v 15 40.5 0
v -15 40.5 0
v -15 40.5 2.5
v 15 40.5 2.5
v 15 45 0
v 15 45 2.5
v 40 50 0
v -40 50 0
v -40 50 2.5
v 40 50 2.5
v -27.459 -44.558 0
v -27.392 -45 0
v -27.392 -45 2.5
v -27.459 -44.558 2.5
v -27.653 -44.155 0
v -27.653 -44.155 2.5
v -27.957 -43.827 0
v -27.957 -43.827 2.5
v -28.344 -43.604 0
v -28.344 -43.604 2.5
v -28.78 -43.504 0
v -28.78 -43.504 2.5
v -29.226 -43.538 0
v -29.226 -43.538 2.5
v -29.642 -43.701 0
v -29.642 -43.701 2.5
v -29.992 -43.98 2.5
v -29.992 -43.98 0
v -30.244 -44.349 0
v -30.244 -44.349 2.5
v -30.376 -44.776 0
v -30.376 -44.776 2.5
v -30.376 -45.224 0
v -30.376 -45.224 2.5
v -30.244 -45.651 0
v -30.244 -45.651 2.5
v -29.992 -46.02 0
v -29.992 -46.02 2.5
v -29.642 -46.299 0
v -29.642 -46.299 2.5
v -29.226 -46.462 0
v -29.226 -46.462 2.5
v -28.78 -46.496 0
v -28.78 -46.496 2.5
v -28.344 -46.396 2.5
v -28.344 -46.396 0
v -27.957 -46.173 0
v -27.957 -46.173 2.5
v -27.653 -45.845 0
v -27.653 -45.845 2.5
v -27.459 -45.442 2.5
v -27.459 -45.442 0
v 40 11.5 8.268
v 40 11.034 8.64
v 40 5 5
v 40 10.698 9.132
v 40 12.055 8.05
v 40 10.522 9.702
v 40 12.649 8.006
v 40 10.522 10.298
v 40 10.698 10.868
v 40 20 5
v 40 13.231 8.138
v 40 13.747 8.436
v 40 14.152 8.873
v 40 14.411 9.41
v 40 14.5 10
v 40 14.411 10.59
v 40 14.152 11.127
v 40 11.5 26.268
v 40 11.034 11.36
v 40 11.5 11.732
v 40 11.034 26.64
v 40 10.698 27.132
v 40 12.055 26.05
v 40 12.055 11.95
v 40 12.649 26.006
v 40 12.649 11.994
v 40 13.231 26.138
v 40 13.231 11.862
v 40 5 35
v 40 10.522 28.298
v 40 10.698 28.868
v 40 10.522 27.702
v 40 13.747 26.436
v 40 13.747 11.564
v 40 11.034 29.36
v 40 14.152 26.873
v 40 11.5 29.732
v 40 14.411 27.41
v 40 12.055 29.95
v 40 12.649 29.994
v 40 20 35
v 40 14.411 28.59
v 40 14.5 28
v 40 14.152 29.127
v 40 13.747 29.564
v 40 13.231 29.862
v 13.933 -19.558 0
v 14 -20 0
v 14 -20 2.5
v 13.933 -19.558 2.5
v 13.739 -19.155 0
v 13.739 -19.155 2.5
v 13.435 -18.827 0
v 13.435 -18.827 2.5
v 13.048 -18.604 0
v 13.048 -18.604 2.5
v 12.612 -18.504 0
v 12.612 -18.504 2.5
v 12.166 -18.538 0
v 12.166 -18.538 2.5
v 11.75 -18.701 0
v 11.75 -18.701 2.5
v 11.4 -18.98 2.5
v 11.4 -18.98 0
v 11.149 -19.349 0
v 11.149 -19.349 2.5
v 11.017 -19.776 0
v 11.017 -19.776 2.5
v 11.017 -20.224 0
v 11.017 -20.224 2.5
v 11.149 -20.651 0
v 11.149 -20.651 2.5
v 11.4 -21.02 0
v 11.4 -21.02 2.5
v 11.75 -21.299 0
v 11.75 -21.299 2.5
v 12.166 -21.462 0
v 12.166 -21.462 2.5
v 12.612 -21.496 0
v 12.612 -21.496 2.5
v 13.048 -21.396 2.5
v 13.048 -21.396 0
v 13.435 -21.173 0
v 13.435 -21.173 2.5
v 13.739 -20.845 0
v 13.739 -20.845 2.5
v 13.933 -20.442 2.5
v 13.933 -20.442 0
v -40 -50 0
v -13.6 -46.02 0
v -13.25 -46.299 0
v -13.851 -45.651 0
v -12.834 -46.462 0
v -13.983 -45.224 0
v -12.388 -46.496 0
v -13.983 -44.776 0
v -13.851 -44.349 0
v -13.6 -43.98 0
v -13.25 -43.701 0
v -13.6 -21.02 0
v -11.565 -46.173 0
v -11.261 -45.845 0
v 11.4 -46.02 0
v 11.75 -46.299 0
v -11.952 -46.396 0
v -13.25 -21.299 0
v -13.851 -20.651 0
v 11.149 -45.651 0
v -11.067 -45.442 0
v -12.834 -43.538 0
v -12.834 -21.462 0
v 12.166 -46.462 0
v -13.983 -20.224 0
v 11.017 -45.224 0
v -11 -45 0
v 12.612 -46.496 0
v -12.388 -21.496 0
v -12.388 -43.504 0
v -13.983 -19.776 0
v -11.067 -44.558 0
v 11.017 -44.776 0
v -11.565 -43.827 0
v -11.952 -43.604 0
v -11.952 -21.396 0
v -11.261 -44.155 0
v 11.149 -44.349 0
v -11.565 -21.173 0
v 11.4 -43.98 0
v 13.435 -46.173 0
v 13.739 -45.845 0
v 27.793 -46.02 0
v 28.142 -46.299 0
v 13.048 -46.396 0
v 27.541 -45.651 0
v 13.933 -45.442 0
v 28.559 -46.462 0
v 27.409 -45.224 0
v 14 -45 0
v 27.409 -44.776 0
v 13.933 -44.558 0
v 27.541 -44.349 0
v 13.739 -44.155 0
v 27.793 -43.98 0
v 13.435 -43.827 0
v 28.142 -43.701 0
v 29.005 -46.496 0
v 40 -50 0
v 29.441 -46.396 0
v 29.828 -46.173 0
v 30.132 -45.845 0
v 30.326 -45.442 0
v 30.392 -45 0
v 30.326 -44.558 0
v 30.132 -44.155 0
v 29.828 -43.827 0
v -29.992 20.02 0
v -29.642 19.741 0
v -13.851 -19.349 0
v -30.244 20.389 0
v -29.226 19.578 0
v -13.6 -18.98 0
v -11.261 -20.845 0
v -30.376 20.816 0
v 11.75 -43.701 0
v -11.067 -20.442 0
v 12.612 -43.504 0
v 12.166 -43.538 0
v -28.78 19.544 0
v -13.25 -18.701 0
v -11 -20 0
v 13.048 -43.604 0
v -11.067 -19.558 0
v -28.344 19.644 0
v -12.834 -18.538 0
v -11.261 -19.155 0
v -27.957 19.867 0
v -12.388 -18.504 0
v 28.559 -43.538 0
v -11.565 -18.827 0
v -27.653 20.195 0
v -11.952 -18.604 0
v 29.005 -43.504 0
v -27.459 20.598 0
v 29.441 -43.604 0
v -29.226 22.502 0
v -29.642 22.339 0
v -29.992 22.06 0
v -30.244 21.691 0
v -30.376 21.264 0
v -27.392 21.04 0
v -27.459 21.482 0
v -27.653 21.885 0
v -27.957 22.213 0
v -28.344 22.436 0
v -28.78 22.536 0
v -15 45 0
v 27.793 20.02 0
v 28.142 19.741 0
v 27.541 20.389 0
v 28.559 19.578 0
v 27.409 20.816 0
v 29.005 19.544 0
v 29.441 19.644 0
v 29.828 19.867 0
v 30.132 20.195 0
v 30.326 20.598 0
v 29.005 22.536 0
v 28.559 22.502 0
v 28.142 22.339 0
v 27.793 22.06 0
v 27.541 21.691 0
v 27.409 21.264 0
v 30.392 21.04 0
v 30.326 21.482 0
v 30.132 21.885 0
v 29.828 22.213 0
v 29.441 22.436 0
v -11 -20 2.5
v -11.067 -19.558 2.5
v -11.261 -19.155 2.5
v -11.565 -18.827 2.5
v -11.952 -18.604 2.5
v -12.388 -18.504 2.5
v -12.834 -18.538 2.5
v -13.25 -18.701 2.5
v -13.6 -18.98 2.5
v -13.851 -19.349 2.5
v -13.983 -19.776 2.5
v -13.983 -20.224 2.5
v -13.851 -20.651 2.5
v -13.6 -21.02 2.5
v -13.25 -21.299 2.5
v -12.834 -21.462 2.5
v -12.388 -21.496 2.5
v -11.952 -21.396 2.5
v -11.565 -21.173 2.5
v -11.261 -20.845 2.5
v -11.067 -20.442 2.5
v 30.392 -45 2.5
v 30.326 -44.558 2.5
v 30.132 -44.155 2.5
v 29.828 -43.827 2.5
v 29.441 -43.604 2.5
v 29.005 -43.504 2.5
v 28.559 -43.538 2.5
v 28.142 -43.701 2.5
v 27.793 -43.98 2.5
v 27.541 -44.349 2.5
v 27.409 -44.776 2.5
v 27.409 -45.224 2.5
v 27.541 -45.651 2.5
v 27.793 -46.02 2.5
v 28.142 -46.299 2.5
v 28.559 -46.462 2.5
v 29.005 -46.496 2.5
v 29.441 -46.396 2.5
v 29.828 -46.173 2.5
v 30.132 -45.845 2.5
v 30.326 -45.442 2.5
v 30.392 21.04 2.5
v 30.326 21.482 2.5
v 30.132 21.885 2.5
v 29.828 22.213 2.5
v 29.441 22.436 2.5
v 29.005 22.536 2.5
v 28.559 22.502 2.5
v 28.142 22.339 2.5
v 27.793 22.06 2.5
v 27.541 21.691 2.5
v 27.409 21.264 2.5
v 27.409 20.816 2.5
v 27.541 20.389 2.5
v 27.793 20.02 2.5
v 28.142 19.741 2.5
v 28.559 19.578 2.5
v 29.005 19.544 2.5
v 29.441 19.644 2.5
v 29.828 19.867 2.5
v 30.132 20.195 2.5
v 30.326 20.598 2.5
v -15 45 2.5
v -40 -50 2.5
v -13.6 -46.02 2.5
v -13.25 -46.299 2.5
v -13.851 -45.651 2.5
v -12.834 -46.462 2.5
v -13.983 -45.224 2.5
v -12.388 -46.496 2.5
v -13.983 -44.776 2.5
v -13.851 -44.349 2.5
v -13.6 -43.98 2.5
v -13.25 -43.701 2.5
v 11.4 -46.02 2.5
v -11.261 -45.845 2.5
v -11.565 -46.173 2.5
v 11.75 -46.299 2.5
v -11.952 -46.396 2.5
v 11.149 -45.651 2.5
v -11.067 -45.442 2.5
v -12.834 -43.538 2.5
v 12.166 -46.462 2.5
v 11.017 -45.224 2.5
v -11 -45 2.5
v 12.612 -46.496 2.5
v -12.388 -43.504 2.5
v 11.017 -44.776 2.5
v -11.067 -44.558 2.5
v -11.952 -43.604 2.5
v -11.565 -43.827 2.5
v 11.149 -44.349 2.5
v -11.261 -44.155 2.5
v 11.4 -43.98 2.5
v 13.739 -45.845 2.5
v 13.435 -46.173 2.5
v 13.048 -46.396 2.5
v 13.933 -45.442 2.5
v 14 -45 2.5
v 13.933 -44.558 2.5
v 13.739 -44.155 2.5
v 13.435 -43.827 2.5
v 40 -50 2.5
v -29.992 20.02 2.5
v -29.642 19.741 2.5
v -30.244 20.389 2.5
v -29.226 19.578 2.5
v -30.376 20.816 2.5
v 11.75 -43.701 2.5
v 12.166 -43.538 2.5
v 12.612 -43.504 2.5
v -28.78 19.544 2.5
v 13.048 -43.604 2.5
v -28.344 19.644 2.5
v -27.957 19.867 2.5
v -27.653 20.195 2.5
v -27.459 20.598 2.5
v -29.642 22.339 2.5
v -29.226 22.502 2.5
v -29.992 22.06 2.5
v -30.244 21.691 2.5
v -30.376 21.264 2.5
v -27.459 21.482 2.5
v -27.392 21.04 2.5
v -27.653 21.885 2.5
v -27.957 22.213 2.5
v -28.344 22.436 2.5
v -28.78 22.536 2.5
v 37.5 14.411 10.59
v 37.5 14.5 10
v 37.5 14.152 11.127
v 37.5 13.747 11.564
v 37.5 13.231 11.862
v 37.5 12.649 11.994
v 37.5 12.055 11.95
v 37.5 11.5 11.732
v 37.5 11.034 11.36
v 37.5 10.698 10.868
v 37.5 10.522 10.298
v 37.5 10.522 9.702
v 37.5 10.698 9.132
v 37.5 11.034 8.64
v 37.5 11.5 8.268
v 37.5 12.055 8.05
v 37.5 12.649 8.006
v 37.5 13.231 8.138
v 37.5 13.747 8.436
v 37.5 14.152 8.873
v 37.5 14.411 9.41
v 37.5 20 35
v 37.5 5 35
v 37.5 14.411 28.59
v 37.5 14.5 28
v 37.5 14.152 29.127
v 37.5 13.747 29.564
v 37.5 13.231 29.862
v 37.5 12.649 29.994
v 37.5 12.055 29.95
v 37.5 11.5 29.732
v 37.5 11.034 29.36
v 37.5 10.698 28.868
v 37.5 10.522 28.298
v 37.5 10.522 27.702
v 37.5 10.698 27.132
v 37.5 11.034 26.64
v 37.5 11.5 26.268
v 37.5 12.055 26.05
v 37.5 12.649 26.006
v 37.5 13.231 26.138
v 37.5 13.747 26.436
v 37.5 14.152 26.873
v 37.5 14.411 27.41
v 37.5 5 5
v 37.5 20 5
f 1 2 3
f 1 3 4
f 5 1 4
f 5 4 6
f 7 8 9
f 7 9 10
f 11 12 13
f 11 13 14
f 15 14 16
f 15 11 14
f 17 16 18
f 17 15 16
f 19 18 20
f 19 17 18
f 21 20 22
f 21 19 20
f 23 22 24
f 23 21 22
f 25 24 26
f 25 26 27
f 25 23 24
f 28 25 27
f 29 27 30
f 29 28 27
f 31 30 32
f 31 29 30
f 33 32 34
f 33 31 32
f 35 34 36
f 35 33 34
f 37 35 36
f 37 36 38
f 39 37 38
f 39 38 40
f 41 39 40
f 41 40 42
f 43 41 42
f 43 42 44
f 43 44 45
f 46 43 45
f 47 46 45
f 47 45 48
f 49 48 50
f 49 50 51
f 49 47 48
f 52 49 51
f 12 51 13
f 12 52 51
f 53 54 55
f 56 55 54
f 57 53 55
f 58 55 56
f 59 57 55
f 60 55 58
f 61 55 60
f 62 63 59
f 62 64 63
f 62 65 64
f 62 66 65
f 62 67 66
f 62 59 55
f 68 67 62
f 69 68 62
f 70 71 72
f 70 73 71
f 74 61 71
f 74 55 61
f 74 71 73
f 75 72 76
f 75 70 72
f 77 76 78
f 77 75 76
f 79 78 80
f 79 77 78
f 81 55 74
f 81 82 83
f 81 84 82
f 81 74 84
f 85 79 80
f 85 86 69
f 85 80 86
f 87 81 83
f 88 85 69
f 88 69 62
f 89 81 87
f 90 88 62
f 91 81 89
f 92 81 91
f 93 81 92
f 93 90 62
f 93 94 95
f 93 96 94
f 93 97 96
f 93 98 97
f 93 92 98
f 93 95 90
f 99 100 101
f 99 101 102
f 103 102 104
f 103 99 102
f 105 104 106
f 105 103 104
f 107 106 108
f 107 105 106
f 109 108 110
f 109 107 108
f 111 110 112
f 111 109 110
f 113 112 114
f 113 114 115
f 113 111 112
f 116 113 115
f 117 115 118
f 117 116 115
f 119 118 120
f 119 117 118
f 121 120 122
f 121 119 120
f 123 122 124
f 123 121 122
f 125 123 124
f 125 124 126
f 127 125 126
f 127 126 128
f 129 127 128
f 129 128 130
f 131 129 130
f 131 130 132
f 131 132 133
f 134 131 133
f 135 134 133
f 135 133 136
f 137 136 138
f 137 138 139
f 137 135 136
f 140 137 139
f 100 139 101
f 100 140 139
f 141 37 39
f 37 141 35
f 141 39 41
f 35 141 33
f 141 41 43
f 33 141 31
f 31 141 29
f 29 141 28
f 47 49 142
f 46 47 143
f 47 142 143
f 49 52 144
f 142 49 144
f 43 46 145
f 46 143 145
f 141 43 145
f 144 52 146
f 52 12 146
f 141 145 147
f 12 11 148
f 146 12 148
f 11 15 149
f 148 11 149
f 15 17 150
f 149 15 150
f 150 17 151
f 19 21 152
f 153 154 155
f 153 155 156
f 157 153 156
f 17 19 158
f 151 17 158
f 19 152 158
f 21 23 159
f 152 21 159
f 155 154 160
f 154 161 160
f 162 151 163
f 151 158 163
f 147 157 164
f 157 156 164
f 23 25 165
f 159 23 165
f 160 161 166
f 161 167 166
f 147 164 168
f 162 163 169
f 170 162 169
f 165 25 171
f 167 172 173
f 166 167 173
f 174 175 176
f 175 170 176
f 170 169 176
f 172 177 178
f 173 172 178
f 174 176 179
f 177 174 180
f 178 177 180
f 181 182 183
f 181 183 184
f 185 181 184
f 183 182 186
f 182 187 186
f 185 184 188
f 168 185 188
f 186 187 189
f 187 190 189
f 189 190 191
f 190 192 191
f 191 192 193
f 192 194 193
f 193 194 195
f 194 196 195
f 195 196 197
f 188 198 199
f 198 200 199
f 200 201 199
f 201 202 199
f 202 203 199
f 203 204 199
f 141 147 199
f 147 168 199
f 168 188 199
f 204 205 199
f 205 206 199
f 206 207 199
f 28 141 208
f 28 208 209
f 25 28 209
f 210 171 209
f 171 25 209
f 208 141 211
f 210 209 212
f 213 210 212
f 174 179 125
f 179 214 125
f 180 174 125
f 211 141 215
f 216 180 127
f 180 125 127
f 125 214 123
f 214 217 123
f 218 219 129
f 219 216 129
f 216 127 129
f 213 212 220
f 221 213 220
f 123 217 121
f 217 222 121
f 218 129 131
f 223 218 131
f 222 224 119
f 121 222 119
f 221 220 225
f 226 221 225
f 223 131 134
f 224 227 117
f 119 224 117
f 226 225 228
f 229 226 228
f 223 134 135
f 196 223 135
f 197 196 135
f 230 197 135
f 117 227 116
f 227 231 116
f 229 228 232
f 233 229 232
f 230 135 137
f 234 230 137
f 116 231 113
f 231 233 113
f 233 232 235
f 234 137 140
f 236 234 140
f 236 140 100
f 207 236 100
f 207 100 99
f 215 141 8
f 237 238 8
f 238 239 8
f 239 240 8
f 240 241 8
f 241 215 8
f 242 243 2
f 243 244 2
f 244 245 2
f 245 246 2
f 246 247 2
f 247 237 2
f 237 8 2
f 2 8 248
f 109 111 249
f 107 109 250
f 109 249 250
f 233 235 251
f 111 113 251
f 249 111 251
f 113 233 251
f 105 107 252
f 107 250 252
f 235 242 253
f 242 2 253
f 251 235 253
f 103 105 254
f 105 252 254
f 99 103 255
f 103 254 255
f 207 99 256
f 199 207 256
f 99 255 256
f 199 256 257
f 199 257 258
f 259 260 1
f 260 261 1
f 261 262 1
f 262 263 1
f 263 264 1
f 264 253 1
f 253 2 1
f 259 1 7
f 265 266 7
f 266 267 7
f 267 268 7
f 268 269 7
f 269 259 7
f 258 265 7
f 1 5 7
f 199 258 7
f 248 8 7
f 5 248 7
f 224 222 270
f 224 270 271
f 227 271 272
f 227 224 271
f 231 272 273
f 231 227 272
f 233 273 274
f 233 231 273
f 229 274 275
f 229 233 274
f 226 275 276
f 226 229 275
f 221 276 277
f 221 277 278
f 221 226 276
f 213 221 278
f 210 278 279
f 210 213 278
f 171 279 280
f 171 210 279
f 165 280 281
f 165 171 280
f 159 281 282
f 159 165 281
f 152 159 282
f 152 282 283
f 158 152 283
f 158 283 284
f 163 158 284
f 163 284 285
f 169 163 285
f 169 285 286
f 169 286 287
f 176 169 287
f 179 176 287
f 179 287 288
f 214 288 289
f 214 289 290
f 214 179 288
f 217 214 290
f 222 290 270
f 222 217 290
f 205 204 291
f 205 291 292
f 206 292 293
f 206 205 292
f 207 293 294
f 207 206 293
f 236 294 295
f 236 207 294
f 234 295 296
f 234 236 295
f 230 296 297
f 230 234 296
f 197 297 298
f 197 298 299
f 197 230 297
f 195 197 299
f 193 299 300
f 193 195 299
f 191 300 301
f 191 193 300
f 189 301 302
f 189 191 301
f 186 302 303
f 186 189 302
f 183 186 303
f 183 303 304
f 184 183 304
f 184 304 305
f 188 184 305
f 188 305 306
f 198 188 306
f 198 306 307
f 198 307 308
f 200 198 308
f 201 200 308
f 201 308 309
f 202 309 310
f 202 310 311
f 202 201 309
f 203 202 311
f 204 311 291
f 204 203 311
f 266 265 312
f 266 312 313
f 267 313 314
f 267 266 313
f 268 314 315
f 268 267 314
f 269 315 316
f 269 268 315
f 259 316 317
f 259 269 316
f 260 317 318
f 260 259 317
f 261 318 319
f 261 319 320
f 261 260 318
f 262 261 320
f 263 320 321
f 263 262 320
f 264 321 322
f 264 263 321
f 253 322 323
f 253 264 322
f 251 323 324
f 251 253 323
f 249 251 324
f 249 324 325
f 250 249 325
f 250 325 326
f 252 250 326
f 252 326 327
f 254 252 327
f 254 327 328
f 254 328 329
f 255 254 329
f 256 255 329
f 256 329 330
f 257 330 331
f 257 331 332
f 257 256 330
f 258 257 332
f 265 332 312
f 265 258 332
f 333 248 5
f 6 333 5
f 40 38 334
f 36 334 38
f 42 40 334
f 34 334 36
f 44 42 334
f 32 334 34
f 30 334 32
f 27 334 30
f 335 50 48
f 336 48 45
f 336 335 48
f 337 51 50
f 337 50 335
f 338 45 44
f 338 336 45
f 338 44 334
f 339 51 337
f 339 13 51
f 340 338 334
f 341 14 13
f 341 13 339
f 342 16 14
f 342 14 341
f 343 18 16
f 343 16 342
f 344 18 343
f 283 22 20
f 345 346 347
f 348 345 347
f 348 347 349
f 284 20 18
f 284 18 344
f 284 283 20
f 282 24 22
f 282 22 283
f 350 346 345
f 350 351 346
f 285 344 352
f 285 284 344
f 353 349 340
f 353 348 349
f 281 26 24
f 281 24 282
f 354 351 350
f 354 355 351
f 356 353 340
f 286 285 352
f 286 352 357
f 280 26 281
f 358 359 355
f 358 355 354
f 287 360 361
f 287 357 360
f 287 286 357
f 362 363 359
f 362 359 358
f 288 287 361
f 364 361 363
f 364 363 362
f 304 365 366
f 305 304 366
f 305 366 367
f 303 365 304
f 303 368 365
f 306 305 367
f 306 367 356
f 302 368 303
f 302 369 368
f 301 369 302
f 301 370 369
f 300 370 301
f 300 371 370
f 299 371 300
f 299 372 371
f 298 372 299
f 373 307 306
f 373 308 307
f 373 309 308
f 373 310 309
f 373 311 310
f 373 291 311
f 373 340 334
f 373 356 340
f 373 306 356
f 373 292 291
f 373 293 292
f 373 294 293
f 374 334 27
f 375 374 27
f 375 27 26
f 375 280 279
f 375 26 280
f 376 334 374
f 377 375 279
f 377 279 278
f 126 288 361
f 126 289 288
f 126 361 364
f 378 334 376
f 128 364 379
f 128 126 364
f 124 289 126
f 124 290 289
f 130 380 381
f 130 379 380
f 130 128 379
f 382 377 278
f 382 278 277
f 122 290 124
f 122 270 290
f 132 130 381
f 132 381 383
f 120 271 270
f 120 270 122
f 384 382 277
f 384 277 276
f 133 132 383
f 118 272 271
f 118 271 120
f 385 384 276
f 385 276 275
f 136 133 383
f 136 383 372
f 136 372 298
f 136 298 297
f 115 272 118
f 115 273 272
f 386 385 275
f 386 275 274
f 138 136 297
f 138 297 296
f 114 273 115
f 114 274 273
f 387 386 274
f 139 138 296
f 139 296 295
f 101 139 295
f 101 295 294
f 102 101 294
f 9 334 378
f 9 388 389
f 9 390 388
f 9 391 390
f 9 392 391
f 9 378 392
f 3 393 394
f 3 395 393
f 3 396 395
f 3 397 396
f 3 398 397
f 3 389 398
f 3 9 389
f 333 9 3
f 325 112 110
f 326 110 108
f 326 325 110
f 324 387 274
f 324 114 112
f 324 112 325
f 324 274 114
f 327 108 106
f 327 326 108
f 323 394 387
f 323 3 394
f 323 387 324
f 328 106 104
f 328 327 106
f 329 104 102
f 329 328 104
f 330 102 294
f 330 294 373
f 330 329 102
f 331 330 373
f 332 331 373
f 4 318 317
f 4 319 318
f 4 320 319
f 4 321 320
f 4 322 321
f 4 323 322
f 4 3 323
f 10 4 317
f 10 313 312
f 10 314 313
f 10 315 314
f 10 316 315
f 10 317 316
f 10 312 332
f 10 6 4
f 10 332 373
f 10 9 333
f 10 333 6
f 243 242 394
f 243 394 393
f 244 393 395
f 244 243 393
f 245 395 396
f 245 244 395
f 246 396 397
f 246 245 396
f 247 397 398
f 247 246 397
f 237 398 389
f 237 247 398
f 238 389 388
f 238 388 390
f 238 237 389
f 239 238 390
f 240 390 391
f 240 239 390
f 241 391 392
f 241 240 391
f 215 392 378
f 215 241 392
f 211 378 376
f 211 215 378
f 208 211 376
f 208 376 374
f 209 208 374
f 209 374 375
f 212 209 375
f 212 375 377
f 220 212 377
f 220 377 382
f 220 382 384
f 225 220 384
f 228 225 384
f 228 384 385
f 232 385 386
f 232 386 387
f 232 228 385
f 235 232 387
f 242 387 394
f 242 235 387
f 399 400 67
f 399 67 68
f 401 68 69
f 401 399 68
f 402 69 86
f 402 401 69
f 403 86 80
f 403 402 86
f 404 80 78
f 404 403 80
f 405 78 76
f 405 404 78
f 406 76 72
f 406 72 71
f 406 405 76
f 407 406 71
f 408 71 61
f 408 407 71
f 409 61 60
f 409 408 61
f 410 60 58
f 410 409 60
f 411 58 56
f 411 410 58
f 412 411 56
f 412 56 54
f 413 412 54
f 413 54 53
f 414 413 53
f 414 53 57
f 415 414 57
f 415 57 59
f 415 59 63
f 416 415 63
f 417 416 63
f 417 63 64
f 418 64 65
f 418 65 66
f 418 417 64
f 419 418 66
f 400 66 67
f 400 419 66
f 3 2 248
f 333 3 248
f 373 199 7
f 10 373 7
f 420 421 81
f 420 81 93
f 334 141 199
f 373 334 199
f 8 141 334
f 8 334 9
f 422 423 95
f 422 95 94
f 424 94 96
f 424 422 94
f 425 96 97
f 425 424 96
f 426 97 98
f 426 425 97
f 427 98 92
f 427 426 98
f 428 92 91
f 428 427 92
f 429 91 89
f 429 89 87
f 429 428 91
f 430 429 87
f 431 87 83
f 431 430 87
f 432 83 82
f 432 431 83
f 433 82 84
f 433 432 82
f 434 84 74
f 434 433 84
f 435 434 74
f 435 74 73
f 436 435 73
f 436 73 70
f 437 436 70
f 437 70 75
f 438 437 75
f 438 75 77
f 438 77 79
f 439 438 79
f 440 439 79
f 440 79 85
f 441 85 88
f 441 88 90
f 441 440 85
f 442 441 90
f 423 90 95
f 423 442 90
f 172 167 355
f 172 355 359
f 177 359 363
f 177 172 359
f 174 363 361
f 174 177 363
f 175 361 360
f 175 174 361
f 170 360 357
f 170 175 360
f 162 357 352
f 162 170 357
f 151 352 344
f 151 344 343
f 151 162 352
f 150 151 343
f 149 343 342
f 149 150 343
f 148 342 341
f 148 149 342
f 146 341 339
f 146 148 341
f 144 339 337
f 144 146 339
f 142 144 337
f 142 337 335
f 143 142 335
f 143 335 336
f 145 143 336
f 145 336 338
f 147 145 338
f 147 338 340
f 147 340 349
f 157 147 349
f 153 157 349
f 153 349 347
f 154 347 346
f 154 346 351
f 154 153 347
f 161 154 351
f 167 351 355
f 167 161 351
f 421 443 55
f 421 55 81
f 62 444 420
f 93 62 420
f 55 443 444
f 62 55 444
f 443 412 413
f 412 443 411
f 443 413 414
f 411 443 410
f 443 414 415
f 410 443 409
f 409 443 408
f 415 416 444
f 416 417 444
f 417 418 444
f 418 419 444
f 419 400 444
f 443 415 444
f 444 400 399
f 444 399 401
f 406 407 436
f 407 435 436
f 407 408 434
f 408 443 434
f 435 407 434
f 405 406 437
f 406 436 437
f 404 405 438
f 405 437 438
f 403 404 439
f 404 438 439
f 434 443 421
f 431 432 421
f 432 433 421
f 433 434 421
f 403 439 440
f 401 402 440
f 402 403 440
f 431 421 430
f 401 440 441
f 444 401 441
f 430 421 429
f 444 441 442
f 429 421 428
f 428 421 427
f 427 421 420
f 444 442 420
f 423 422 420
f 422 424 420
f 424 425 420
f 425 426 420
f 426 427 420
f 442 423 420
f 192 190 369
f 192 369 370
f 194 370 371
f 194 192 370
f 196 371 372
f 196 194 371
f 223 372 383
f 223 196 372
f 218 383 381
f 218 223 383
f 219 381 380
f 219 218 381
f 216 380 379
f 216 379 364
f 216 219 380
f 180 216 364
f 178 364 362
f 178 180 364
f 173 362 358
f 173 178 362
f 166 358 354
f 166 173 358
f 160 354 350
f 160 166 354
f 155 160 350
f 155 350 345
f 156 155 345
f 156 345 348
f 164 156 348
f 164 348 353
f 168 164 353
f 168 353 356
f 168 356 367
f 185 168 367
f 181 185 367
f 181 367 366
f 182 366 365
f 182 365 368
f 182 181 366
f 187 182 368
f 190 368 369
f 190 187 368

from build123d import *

# Parameters (mm, degrees)
SKETCH001_W   = 80
SKETCH001_H   = 100
SKETCH001_R   = 1.5
SKETCH001_W_2 = 30
SKETCH001_H_2 = 4.5
PAD_DEPTH     = 2.5
SKETCH_W      = 15
SKETCH_H      = 30
SKETCH_R      = 2
PAD001_DEPTH  = 2.5


with BuildPart() as base:
    # Sketch001 → Pad (new body)
    with BuildSketch(Plane.XY):
        Rectangle(SKETCH001_W, SKETCH001_H)
        with Locations((-28.8925, 21.04)):
            Circle(SKETCH001_R, mode=Mode.SUBTRACT)
        with Locations((-28.8925, -45)):
            Circle(SKETCH001_R, mode=Mode.SUBTRACT)
        with Locations((28.8925, -45)):
            Circle(SKETCH001_R, mode=Mode.SUBTRACT)
        with Locations((28.8925, 21.04)):
            Circle(SKETCH001_R, mode=Mode.SUBTRACT)
        with Locations((-12.5, -20)):
            Circle(SKETCH001_R, mode=Mode.SUBTRACT)
        with Locations((-12.5, -45)):
            Circle(SKETCH001_R, mode=Mode.SUBTRACT)
        with Locations((12.5, -20)):
            Circle(SKETCH001_R, mode=Mode.SUBTRACT)
        with Locations((12.5, -45)):
            Circle(SKETCH001_R, mode=Mode.SUBTRACT)
        with Locations((0, 42.75)):
            Rectangle(SKETCH001_W_2, SKETCH001_H_2, mode=Mode.SUBTRACT)
    extrude(amount=PAD_DEPTH)


with BuildPart() as motorholder:
    # Sketch → Pad001 (new body)
    with BuildSketch(Plane.YZ):
        with Locations((12.5, 20)):
            Rectangle(SKETCH_W, SKETCH_H)
        with Locations((12.5, 28)):
            Circle(SKETCH_R, mode=Mode.SUBTRACT)
        with Locations((12.5, 10)):
            Circle(SKETCH_R, mode=Mode.SUBTRACT)
    extrude(amount=PAD001_DEPTH)


with BuildPart() as motorholder_1:
    # Body001 placement: moved
    add(motorholder.part.moved(Location((37.5, 0, 0))))


solid = Compound([base.part, motorholder_1.part])
